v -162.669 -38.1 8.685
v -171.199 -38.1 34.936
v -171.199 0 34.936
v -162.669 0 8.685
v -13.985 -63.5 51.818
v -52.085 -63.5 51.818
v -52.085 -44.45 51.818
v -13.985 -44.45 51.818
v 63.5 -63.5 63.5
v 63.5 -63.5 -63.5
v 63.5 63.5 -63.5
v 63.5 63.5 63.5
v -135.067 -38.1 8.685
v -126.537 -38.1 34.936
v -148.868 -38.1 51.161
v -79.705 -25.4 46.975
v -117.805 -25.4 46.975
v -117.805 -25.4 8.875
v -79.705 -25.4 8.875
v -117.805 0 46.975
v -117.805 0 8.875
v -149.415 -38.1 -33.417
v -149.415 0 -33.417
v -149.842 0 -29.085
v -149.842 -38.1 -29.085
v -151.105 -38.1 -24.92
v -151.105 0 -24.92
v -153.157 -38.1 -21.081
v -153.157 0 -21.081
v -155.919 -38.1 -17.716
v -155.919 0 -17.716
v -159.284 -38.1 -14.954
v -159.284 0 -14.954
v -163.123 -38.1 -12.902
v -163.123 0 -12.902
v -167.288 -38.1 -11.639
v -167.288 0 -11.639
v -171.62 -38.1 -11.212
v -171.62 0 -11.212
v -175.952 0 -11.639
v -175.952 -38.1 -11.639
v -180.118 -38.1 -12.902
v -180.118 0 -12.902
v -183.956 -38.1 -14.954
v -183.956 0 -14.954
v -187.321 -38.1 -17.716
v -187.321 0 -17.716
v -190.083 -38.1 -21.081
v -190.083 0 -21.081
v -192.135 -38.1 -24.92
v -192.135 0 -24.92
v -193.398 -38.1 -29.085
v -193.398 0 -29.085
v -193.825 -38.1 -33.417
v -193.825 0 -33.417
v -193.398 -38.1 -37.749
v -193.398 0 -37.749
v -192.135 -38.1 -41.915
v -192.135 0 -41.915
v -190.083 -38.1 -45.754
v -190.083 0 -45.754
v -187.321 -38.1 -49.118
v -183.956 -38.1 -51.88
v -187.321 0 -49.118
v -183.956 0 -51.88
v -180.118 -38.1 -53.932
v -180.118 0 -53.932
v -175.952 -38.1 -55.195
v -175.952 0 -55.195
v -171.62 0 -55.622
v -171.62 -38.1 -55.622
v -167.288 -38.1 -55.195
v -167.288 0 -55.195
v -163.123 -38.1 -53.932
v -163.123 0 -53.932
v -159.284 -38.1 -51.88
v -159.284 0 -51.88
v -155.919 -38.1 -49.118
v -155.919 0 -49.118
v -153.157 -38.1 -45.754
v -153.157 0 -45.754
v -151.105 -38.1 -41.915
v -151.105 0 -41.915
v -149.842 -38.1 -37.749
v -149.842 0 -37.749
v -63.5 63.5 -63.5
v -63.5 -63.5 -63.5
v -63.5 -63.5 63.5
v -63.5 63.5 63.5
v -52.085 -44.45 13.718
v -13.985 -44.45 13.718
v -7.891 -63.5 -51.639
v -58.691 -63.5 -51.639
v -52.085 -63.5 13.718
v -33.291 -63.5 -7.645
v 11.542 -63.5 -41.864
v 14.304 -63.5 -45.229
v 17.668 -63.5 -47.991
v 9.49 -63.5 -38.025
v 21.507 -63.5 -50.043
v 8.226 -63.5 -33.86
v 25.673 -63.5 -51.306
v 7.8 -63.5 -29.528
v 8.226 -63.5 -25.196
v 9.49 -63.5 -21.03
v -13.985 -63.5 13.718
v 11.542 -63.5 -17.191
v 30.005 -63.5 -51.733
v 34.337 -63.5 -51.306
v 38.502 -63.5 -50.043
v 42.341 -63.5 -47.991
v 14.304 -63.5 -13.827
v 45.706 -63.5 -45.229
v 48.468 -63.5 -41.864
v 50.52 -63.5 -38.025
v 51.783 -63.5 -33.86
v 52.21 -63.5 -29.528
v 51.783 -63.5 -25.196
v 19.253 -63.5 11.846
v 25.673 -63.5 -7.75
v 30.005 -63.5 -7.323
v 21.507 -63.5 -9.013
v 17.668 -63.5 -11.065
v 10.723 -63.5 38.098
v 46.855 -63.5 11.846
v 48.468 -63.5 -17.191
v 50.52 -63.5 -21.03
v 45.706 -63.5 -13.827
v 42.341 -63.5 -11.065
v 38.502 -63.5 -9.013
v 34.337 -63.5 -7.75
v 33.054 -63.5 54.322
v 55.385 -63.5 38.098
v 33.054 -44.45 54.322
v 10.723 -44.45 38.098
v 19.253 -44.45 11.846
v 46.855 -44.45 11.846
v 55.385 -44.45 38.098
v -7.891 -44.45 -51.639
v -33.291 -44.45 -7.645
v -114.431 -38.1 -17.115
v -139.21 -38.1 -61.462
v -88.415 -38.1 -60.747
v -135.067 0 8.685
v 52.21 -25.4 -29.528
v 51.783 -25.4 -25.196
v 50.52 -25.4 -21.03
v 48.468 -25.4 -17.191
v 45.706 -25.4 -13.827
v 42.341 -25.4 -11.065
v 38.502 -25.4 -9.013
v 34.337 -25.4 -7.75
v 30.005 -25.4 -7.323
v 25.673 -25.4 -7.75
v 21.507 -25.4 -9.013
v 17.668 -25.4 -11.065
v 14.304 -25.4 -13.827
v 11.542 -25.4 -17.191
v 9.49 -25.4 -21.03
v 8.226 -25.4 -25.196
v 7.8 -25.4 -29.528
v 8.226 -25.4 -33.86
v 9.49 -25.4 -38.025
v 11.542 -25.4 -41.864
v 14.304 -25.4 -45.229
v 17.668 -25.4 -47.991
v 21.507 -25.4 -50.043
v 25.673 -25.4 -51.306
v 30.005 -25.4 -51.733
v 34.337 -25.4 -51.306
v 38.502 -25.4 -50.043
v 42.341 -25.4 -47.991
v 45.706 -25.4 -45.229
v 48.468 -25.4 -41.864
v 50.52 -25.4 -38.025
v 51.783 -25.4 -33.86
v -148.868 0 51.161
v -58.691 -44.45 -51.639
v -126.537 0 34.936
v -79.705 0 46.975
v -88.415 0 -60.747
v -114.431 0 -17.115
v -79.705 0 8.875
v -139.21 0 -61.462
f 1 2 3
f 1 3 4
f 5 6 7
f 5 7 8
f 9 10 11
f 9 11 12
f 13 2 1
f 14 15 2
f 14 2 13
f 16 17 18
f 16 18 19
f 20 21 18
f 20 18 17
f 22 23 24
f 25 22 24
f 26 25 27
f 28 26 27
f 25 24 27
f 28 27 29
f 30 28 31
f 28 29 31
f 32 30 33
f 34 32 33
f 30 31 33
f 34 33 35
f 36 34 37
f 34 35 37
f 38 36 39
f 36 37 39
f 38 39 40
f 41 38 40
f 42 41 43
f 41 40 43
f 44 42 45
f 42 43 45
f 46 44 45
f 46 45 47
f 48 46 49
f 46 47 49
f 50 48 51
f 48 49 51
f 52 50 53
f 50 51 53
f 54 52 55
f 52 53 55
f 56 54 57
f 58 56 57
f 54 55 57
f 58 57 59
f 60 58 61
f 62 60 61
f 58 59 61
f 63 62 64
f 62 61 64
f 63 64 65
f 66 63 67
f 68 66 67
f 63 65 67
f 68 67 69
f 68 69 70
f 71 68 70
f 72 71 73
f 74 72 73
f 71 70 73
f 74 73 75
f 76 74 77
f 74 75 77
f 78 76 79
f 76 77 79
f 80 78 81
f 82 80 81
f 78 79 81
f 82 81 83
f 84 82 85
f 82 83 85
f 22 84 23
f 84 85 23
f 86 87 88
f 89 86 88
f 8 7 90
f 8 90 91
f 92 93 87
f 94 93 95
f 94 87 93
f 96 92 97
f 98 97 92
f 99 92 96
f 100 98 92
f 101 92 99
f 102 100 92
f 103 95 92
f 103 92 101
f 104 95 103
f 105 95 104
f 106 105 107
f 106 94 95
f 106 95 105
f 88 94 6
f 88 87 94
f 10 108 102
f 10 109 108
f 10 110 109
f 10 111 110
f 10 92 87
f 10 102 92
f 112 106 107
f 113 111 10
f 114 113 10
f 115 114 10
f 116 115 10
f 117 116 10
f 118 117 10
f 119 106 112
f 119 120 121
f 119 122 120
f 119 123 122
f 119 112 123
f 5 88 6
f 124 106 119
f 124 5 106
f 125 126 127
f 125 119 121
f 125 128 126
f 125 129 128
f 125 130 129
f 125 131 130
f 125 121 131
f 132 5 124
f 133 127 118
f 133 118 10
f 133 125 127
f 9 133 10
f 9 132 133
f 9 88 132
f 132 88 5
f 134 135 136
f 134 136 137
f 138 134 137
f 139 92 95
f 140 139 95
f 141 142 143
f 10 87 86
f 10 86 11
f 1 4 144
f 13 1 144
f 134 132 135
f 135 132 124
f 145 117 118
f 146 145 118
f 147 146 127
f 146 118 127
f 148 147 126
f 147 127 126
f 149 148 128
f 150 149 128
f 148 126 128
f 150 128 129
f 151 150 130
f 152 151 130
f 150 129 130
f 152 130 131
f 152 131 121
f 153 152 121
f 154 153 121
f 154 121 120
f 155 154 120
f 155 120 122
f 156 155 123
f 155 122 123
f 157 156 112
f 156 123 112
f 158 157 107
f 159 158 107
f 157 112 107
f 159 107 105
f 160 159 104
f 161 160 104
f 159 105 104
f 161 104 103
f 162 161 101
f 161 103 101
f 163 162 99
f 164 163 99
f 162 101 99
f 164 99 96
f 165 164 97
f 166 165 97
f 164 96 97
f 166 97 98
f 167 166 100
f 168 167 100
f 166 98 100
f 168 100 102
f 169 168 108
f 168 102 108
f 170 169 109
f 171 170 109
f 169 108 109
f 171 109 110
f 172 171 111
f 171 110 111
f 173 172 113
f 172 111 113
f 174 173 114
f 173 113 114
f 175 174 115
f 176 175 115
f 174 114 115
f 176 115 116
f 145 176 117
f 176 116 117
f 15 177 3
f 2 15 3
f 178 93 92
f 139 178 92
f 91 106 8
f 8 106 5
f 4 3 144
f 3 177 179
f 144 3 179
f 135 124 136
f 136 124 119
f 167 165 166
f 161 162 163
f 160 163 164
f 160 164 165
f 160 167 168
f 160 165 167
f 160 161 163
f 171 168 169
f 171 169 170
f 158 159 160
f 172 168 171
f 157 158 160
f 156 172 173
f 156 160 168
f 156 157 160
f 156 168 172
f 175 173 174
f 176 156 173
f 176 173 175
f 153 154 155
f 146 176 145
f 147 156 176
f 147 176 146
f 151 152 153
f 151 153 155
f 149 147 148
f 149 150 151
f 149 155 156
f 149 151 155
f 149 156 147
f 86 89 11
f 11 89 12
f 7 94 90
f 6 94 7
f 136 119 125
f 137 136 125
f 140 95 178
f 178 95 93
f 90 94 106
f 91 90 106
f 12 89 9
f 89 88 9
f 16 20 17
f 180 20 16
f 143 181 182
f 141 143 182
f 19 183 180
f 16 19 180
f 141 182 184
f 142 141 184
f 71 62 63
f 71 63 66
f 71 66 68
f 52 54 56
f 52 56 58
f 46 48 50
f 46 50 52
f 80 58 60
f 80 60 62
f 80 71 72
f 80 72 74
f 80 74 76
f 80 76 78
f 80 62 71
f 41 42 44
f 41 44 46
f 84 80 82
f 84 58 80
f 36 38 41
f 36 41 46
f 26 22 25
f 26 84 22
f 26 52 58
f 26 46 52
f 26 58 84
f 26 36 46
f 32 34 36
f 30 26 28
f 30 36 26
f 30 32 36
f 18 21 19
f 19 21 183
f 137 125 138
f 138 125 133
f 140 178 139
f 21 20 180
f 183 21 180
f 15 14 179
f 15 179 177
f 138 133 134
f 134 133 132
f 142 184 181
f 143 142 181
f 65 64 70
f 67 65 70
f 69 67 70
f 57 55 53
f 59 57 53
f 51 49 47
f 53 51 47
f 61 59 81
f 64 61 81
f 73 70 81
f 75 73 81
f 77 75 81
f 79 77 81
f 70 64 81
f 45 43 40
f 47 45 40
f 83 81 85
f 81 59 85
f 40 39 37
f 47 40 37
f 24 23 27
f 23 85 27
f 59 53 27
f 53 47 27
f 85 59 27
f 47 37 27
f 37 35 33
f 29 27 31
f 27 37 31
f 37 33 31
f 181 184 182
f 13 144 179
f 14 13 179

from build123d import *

# Parameters (mm, degrees)
F0_W      = 127
F0_H      = 127
F1_DEPTH  = 63.5
F2_W      = 38.1
F2_H      = 38.1
F3_DEPTH  = 19.05
F5_DEPTH  = 19.05
F7_DEPTH  = 19.05
F8_R      = 22.204998
F9_DEPTH  = 38.1
F10_W     = 38.1
F10_H     = 38.1
F11_DEPTH = 25.4
F13_DEPTH = 38.1
F15_DEPTH = 38.1
F16_R     = 22.204998
F17_DEPTH = 38.1


with BuildPart() as f1:
    # F0 (on Front) → F1 (new body, symmetric)
    with BuildSketch(Plane.XZ):
        Rectangle(F0_W, F0_H)
    extrude(amount=F1_DEPTH, both=True)

    # F2 (on face) → F3 (cut, symmetric)
    with BuildSketch(Plane.XZ.offset(63.5)):
        with Locations((-33.035155, 32.767861)):
            Rectangle(F2_W, F2_H)
    extrude(amount=F3_DEPTH, both=True, mode=Mode.SUBTRACT)

    # F4 (on face) → F5 (cut, symmetric)
    with BuildSketch(Plane.XZ.offset(63.5)):
        Polygon((55.385031, 38.097626), (33.054002, 54.322068), (10.722973, 38.097626), (19.252667, 11.845927), (46.855337, 11.845927), align=None)
    extrude(amount=F5_DEPTH, both=True, mode=Mode.SUBTRACT)

    # F6 (on face) → F7 (cut, symmetric)
    with BuildSketch(Plane.XZ.offset(63.5)):
        Polygon((-58.690952, -51.639486), (-7.890952, -51.639486), (-33.290952, -7.645395), align=None)
    extrude(amount=F7_DEPTH, both=True, mode=Mode.SUBTRACT)

    # F8 (on face) → F9 (cut)
    with BuildSketch(Plane.XZ.offset(63.5)):
        with Locations((30.004811, -29.527906)):
            Circle(F8_R)
    extrude(amount=-F9_DEPTH, mode=Mode.SUBTRACT)


with BuildPart() as f11:
    # F10 (on Front) → F11 (new body)
    with BuildSketch(Plane.XZ):
        with Locations((-98.754699, 27.924845)):
            Rectangle(F10_W, F10_H)
    extrude(amount=F11_DEPTH)


with BuildPart() as f13:
    # F12 (on Front) → F13 (new body)
    with BuildSketch(Plane.XZ):
        Polygon((-88.414853, -60.747008), (-114.431366, -17.114669), (-139.209824, -61.4618), align=None)
    extrude(amount=F13_DEPTH)


with BuildPart() as f15:
    # F14 (on Front) → F15 (new body)
    with BuildSketch(Plane.XZ):
        Polygon((-135.066645, 8.684747), (-126.536951, 34.936446), (-148.86798, 51.160888), (-171.199008, 34.936446), (-162.669314, 8.684747), align=None)
    extrude(amount=F15_DEPTH)


with BuildPart() as f17:
    # F16 (on Front) → F17 (new body)
    with BuildSketch(Plane.XZ):
        with Locations((-171.620026, -33.417065)):
            Circle(F16_R)
    extrude(amount=F17_DEPTH)


solid = Compound([f1.part, f11.part, f13.part, f15.part, f17.part])
